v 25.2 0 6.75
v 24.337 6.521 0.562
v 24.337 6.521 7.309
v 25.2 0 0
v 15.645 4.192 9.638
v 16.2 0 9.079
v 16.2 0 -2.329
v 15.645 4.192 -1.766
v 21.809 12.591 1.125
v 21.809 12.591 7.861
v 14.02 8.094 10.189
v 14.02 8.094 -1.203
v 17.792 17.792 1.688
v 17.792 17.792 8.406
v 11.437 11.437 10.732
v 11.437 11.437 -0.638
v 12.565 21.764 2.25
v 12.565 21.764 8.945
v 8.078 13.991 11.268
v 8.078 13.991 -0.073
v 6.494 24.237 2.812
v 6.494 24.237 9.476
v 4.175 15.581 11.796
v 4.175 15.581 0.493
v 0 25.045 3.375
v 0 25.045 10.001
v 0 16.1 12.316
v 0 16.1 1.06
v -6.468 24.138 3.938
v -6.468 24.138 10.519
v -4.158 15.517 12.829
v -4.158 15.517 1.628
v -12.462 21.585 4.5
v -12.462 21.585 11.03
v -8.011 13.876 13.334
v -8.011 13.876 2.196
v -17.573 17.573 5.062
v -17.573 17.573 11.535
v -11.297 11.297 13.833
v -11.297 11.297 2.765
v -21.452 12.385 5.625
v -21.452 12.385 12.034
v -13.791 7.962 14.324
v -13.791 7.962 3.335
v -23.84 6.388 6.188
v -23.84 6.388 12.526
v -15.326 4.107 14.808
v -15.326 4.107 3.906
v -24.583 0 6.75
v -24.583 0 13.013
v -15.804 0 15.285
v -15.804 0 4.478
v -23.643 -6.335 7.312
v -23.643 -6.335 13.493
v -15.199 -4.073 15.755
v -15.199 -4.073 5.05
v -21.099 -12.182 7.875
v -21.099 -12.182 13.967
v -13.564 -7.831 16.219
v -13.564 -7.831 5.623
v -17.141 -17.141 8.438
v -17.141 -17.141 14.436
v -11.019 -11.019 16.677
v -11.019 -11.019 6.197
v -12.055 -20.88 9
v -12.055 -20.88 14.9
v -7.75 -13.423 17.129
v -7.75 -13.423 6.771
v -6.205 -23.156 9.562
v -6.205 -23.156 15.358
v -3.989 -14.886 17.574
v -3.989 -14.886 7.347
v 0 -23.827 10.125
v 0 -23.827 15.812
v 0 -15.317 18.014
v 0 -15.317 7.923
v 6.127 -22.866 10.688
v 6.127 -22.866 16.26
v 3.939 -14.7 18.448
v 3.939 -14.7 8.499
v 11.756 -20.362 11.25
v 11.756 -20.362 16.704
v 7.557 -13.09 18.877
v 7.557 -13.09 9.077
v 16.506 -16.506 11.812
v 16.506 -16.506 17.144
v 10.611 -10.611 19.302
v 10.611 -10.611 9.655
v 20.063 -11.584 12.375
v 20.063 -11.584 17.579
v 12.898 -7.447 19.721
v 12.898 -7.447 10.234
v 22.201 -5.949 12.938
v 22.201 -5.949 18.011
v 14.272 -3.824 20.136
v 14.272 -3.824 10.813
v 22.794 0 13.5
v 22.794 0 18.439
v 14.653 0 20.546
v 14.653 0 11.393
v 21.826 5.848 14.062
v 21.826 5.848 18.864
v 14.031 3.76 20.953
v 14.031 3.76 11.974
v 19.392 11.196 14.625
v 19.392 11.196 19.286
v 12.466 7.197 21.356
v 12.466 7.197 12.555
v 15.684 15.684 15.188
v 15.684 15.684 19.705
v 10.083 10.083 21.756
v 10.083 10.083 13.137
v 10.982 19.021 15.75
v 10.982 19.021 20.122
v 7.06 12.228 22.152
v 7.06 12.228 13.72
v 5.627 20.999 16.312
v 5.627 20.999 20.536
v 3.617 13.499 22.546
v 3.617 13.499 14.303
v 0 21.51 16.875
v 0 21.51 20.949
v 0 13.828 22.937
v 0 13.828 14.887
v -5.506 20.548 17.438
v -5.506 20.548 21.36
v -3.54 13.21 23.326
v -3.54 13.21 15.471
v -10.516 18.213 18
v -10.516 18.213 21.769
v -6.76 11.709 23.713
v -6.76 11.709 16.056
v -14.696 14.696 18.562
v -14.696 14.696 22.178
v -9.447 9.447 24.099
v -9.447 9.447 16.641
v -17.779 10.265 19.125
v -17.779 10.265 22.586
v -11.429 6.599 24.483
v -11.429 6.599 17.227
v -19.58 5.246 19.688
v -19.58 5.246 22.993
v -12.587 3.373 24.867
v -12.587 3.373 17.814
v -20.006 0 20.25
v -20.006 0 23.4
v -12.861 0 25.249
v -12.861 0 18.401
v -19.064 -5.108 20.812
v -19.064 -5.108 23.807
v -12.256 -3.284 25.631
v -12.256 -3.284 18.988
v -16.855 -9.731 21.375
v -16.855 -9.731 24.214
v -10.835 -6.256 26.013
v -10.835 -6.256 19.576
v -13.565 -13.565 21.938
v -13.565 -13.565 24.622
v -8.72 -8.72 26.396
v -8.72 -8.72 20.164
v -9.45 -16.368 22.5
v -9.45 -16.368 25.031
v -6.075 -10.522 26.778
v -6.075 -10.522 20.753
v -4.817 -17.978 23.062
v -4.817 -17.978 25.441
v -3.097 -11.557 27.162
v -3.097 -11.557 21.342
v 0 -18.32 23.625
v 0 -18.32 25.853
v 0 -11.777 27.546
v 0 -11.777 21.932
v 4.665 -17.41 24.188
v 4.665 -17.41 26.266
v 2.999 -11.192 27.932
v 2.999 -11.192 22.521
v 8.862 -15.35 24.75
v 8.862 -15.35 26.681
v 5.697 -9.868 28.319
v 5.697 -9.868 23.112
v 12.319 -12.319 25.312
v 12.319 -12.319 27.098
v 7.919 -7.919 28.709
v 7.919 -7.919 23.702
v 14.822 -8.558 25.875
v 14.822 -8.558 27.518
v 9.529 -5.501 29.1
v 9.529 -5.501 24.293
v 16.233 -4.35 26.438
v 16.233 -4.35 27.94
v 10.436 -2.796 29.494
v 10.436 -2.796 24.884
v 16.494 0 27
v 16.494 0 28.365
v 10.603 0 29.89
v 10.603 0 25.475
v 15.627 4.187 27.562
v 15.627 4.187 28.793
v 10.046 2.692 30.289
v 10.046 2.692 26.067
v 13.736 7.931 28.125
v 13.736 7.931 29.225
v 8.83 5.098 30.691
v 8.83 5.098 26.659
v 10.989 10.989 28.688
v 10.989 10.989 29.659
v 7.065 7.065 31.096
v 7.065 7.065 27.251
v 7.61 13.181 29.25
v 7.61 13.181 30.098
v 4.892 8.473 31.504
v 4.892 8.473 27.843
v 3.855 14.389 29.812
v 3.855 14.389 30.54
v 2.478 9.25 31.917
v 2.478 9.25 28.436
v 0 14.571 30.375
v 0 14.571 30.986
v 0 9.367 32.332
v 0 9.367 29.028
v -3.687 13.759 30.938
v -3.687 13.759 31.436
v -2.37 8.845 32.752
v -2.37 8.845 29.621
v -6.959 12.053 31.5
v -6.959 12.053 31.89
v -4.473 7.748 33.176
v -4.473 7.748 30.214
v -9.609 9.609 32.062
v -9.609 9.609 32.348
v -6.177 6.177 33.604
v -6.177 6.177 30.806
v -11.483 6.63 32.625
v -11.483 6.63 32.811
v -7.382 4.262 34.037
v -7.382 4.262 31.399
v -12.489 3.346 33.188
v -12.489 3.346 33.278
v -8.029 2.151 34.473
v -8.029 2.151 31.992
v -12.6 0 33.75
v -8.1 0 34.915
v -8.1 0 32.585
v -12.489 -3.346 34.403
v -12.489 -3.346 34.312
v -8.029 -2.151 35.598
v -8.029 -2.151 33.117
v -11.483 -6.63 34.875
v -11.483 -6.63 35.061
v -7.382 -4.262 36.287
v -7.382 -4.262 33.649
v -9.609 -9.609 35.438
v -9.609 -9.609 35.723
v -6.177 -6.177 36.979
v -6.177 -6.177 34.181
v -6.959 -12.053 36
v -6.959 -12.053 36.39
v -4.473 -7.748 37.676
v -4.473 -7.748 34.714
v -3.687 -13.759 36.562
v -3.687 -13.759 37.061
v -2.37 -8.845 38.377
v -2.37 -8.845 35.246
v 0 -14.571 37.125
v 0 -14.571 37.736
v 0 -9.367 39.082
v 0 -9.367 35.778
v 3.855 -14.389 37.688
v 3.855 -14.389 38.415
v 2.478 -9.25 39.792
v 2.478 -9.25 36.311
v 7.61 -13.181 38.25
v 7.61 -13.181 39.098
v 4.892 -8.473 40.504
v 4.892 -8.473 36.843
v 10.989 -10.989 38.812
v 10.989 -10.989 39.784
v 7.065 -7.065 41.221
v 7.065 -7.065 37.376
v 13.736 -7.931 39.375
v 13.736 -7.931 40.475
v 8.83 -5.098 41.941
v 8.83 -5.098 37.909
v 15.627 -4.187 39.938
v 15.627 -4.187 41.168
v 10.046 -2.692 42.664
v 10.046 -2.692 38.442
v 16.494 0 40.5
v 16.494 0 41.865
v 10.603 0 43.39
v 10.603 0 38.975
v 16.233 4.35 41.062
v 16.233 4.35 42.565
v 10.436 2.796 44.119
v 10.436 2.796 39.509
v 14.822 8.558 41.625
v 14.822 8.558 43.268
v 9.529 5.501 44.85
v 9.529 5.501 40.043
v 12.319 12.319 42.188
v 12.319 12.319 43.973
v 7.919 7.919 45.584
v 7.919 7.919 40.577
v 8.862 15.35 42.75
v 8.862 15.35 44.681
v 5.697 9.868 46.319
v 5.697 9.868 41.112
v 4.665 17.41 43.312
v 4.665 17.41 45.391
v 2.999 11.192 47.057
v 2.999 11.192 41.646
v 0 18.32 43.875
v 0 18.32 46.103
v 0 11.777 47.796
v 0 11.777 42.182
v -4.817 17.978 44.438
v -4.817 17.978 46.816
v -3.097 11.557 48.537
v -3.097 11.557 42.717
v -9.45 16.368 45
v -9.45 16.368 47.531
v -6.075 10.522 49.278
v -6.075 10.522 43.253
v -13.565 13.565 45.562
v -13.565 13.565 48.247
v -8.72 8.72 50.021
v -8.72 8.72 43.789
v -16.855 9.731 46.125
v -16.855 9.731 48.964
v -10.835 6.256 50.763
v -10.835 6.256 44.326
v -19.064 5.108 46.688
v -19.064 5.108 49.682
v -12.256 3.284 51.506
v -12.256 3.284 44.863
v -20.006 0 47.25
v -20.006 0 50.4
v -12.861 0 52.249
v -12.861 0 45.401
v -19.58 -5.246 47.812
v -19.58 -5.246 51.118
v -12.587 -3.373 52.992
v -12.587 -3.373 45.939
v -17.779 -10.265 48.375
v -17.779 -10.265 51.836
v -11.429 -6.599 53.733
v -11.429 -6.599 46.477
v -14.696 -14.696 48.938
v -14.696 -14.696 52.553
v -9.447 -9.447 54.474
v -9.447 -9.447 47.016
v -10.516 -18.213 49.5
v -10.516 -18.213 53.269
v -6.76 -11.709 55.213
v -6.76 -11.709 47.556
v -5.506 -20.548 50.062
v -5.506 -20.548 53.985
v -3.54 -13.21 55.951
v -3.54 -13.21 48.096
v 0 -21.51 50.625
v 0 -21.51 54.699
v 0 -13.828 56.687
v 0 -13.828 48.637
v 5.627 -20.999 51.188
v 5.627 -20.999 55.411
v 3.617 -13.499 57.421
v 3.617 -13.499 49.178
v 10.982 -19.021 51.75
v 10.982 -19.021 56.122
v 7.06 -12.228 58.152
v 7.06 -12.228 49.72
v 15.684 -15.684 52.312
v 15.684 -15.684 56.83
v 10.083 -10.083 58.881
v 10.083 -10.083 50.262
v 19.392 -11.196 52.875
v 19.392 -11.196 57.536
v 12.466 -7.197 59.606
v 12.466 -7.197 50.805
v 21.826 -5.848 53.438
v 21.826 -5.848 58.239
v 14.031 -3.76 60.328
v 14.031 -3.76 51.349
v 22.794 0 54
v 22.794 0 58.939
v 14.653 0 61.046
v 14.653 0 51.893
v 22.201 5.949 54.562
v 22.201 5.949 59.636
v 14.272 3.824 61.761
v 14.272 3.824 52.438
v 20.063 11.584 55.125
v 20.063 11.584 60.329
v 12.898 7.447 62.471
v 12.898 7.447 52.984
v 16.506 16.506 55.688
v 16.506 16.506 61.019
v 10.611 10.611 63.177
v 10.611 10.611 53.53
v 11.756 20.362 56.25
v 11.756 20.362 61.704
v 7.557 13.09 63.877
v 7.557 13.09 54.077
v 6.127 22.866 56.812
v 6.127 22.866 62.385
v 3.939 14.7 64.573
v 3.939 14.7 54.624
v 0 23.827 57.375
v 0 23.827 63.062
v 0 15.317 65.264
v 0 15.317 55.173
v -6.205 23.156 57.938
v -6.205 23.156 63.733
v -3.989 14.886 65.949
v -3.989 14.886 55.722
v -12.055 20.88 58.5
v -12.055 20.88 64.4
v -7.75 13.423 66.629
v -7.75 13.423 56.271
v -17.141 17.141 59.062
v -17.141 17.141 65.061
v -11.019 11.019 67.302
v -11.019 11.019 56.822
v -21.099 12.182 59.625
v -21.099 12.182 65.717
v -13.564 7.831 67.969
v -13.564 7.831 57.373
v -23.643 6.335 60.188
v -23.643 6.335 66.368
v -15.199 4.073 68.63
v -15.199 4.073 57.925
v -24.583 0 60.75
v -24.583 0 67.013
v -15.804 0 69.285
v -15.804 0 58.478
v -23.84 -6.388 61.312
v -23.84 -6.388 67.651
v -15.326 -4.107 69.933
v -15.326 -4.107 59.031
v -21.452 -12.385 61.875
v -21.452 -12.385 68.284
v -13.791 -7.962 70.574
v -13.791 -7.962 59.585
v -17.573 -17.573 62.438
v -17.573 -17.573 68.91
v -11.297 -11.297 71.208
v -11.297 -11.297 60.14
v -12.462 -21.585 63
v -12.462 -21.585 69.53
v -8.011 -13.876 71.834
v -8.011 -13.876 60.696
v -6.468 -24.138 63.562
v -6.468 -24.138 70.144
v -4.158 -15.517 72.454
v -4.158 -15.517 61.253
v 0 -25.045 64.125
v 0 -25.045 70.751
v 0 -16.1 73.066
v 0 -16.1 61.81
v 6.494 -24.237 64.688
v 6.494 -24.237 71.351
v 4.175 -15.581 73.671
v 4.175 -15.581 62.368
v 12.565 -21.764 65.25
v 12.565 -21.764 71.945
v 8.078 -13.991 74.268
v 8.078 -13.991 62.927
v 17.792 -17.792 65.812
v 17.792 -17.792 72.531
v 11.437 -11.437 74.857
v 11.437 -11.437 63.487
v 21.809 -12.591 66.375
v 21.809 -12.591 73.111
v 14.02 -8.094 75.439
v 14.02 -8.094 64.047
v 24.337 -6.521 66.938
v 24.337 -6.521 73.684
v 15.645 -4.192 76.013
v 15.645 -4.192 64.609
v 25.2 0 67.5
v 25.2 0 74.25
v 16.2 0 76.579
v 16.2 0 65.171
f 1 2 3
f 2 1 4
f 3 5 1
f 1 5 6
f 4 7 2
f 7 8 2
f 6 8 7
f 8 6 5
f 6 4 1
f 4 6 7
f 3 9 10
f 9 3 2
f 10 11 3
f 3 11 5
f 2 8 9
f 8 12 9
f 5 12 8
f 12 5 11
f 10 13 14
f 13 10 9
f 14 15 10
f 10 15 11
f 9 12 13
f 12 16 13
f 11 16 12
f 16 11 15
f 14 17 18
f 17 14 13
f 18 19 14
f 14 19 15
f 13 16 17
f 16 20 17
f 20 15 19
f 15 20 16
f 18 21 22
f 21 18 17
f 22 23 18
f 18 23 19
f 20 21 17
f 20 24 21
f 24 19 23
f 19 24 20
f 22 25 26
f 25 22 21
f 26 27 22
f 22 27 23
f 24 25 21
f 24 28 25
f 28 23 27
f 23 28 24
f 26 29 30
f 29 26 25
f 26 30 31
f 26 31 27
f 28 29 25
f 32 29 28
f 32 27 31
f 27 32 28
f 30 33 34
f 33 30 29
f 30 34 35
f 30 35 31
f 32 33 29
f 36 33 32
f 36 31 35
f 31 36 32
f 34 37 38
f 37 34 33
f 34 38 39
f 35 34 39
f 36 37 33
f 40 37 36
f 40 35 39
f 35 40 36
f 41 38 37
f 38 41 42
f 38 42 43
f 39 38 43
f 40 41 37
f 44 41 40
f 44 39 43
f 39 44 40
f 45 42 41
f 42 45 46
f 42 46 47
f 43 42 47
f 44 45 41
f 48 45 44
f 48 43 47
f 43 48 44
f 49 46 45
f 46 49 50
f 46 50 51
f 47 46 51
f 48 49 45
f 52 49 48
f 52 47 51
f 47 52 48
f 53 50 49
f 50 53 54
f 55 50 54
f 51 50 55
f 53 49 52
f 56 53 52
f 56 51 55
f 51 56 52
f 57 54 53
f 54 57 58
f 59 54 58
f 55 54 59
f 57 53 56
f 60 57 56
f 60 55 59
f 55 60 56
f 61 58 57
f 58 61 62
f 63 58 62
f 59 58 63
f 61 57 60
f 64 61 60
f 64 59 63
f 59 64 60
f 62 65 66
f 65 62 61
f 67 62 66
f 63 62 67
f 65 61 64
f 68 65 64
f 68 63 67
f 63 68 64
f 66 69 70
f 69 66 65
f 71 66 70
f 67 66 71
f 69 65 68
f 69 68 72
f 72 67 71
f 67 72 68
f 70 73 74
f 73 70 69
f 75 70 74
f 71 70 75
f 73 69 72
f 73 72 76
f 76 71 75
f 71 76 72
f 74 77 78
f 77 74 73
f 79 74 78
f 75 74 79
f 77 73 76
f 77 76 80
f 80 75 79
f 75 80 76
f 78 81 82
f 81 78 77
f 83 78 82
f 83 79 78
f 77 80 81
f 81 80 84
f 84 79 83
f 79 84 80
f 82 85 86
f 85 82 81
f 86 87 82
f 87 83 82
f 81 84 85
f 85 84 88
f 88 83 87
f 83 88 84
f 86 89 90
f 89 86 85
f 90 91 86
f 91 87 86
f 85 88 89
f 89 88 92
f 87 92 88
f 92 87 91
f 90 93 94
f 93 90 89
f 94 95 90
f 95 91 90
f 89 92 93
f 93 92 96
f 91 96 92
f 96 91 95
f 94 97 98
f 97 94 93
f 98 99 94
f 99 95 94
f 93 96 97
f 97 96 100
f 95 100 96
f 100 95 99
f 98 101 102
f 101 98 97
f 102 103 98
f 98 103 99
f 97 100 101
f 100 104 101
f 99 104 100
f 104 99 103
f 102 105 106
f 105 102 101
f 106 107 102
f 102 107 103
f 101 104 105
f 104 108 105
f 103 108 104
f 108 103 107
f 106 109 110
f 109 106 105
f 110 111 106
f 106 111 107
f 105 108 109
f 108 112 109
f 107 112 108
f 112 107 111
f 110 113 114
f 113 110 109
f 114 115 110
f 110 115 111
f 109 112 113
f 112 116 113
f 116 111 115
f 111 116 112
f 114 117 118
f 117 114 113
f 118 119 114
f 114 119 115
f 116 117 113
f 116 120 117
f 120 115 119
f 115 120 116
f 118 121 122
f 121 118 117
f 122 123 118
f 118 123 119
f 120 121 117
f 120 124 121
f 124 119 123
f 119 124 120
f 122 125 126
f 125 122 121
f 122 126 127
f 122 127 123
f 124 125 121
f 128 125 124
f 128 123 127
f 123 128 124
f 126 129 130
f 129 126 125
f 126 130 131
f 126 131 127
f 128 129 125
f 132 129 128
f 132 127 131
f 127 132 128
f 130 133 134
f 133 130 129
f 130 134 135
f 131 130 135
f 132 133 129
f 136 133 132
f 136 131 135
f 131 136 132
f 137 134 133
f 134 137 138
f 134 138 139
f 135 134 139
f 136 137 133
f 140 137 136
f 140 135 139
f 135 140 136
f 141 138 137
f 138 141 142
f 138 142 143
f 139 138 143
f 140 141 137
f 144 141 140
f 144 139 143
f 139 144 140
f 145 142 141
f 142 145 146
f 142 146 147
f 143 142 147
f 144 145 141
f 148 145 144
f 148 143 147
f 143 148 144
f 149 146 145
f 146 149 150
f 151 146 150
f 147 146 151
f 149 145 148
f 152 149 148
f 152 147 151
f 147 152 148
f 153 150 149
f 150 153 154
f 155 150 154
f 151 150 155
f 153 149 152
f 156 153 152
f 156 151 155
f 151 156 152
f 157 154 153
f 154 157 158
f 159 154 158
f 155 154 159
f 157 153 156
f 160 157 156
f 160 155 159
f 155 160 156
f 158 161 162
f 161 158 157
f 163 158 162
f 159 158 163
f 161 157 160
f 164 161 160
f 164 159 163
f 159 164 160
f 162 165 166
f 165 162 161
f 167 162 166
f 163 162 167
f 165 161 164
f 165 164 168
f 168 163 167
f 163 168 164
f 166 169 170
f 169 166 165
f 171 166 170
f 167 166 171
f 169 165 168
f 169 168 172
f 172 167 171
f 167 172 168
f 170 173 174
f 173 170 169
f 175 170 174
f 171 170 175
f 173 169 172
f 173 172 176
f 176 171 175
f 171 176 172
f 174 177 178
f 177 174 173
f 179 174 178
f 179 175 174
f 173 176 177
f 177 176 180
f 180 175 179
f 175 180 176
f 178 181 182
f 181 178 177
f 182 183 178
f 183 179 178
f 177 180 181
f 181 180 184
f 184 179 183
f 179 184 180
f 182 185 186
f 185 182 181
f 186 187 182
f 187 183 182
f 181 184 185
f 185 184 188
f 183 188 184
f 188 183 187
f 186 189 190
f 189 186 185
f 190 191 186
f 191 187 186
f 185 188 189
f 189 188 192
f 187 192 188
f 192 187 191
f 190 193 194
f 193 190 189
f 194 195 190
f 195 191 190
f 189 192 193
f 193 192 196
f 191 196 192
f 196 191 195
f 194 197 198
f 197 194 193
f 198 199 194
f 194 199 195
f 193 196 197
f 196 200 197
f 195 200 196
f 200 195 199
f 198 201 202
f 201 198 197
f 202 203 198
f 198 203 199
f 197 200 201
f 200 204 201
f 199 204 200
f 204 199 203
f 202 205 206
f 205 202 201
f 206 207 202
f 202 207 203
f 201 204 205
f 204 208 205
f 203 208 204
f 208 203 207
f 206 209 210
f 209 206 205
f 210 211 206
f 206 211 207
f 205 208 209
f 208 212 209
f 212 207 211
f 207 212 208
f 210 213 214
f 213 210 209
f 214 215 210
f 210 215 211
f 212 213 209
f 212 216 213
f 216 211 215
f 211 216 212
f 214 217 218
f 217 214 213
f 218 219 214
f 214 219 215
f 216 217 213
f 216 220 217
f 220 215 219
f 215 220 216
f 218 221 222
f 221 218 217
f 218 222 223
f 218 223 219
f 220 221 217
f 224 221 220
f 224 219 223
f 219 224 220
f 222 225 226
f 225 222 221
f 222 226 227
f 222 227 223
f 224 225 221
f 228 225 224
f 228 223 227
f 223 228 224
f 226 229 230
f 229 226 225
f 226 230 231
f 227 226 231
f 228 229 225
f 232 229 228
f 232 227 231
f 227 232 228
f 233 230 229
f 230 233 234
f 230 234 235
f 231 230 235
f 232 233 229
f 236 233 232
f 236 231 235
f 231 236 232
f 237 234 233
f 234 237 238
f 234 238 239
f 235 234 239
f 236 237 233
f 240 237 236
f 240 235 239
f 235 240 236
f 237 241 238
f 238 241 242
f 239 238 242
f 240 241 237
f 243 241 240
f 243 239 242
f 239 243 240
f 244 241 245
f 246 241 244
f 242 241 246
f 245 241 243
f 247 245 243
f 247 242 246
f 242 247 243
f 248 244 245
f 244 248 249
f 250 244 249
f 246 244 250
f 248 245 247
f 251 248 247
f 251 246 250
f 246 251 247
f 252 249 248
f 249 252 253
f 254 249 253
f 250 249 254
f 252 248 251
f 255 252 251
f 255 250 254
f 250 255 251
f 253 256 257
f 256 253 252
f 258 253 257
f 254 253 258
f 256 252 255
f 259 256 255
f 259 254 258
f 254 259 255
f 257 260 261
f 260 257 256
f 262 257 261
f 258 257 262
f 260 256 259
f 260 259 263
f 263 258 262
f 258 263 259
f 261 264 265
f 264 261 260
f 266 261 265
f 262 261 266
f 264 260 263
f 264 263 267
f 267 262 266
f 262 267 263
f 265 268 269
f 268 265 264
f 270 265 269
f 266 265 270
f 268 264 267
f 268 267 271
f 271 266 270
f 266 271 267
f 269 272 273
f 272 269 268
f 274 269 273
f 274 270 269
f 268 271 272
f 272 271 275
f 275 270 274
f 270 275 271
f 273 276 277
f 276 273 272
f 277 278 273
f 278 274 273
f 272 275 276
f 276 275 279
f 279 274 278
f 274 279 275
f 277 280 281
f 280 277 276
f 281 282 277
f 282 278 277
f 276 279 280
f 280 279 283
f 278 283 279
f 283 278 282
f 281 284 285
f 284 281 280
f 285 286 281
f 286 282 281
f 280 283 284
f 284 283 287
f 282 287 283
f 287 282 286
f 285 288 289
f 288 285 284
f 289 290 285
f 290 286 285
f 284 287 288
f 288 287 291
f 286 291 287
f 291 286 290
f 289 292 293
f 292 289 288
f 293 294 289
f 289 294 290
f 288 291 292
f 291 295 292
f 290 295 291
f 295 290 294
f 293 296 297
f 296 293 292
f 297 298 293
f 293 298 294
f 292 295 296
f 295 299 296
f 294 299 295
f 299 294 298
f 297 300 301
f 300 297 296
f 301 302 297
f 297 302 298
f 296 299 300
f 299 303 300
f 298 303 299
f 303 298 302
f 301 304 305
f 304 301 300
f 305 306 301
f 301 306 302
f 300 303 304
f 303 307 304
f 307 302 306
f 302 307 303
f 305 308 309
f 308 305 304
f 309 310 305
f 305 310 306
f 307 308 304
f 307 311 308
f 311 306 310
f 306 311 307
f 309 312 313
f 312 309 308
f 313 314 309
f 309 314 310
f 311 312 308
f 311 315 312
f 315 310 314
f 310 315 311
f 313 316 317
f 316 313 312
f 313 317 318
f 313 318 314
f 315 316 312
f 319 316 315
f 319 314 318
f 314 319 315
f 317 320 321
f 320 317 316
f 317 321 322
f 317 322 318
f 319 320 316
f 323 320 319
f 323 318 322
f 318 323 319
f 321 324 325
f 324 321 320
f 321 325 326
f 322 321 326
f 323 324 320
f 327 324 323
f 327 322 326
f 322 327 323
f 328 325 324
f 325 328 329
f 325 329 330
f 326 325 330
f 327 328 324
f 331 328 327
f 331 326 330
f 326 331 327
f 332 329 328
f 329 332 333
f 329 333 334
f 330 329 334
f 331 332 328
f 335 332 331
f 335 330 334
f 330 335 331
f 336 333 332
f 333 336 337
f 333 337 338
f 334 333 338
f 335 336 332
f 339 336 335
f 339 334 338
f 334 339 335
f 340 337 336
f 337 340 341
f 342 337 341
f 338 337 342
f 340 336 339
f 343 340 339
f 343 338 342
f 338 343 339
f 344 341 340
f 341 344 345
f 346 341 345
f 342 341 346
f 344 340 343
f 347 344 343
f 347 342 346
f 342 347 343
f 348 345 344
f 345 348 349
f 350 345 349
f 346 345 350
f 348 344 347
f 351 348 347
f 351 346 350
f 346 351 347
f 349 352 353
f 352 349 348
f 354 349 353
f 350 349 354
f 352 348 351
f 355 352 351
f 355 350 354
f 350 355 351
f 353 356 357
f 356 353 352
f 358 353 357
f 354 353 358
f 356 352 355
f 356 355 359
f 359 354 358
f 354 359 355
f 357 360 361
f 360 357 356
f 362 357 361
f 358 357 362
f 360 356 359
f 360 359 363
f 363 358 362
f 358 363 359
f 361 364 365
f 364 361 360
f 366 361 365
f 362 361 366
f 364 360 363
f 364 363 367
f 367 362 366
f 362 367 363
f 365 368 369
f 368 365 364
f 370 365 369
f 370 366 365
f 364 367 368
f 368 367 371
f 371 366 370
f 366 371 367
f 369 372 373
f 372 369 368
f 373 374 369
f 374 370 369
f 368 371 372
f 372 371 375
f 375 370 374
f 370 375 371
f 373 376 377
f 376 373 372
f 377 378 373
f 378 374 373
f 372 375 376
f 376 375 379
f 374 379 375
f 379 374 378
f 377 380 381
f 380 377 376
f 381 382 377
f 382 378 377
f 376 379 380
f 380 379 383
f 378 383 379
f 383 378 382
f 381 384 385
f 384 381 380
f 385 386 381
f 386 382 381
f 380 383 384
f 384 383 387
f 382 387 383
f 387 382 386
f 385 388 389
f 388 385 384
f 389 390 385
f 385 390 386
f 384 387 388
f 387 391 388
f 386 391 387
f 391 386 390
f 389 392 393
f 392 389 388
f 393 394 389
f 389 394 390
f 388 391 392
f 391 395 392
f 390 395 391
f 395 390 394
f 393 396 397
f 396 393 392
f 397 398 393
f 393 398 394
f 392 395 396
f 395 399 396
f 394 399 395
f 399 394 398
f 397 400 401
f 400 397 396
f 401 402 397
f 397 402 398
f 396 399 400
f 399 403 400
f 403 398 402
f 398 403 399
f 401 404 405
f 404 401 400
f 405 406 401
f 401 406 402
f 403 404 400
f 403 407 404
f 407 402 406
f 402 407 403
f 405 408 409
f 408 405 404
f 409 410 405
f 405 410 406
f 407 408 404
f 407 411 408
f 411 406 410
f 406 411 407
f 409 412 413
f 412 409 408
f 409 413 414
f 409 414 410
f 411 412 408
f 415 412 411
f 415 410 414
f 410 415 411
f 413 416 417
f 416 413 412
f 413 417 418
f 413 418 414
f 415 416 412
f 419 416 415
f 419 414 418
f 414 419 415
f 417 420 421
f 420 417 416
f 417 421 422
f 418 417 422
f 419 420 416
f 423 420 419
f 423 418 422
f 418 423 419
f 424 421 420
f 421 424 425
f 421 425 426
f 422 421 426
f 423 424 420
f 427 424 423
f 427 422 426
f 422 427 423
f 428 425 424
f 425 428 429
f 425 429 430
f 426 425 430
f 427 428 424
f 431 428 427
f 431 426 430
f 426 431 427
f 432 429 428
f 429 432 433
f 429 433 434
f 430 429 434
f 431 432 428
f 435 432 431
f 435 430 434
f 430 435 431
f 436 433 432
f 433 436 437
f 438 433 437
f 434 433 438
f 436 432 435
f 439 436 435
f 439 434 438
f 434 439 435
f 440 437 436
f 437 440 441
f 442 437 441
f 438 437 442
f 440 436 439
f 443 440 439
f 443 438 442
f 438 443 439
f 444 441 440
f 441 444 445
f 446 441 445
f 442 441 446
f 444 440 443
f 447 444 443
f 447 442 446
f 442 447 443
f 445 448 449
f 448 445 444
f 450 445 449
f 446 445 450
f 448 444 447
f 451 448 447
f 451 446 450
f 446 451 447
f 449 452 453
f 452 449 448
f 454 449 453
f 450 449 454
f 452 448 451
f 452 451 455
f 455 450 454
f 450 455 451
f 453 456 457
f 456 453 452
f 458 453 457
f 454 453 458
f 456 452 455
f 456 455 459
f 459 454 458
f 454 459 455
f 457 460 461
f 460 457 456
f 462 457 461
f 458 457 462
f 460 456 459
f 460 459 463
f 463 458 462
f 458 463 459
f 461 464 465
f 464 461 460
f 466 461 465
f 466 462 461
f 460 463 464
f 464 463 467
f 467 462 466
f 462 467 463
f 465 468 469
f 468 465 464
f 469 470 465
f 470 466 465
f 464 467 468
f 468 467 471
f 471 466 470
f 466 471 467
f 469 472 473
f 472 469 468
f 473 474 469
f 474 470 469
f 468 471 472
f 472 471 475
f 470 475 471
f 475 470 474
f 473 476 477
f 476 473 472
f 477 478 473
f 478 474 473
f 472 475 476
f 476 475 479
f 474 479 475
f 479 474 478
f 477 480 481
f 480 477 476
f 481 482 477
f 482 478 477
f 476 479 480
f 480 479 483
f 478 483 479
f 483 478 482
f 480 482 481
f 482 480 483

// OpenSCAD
scale=0.9;

numberTurns=5;

steps=24*numberTurns;

module slice(Xa, Ya, Za, Xb, Yb, Zb, radiusa, radiusb, tipRatioa, tipRatiob)
{	
	angleZ=atan2(Ya, Xa);
	twistZ=atan2(Yb, Xb)-atan2(Ya, Xa);

	polyPoints=[
		[Xa+ radiusa*cos(+angleZ),		Ya+ radiusa*sin(+angleZ),		Za ],
		[Xa+ radiusa*cos(+angleZ),		Ya+ radiusa*sin(+angleZ),		Za + radiusa*tipRatioa ],
		[Xa ,						Ya ,						Za+ radiusa*(tipRatioa+sin(15)) ],
		[Xa ,						Ya ,						Za ],
		[Xa ,						Ya ,						Za+ radiusa*sin(-15) ],
	
		[Xb+ radiusb*cos(angleZ+twistZ),	Yb+ radiusb*sin(angleZ+twistZ),	Zb ],
		[Xb+ radiusb*cos(angleZ+twistZ),	Yb+ radiusb*sin(angleZ+twistZ),	Zb+ radiusb*tipRatiob ],
		[Xb ,						Yb ,						Zb+ radiusb*(tipRatiob+sin(15)) ],
		[Xb ,						Yb ,						Zb ],
		[Xb ,						Yb ,						Zb+ radiusb*sin(-15)] ];
	
	polyTriangles=[
		[ 0, 6, 1 ], [ 0, 5, 6 ], 					// tip of profile
		[ 1, 6, 7 ], [ 1, 7, 2 ], 					// upper side of profile
		[ 0, 4, 5 ], [ 4, 9, 5 ], 					// lower side of profile
		[ 4, 3, 9 ], [ 9, 3, 8 ], [ 3, 2, 8 ], [ 8, 2, 7 ], 	// back of profile
		[ 0, 3, 4 ], [ 0, 2, 3 ], [ 0, 1, 2 ], 			// a side of profile
		[ 5, 9, 8 ], [ 5, 8, 7 ], [ 5, 7, 6 ]  			// b side of profile
		 ];
	
	color([(radiusa)/10/scale,(radiusa)/10/scale,(radiusa)/10/scale])
	polyhedron( polyPoints, polyTriangles );
}

function 	size(i)=	10*scale*(0.5+0.5*abs(cos(i*180)));

function 	X(i)=		2*scale*(size(i))*cos(i*360*numberTurns);
function 	Y(i)=		2*scale*(size(i))*sin(i*360*numberTurns);
function 	Z(i)=		scale*15*numberTurns*i;

function	tip(i)=	0.75*abs(cos(i*180));

module corkscrew()
{
	for (i=[0:steps-1])
	{
		slice(
			Xa=		X(i/steps),
			Ya=		Y(i/steps),
			Za=		Z(i/steps),
			Xb=		X((i+1)/steps),
			Yb=		Y((i+1)/steps), 
			Zb=		Z((i+1)/steps), 
			radiusa=	size(i/steps), 
			radiusb=	size((i+1)/steps),
			tipRatioa=	tip(i/steps),
			tipRatiob=	tip((i+1)/steps)
			);
	}
}


corkscrew();

//slice(0,10,0,10,10,5,10,10);
